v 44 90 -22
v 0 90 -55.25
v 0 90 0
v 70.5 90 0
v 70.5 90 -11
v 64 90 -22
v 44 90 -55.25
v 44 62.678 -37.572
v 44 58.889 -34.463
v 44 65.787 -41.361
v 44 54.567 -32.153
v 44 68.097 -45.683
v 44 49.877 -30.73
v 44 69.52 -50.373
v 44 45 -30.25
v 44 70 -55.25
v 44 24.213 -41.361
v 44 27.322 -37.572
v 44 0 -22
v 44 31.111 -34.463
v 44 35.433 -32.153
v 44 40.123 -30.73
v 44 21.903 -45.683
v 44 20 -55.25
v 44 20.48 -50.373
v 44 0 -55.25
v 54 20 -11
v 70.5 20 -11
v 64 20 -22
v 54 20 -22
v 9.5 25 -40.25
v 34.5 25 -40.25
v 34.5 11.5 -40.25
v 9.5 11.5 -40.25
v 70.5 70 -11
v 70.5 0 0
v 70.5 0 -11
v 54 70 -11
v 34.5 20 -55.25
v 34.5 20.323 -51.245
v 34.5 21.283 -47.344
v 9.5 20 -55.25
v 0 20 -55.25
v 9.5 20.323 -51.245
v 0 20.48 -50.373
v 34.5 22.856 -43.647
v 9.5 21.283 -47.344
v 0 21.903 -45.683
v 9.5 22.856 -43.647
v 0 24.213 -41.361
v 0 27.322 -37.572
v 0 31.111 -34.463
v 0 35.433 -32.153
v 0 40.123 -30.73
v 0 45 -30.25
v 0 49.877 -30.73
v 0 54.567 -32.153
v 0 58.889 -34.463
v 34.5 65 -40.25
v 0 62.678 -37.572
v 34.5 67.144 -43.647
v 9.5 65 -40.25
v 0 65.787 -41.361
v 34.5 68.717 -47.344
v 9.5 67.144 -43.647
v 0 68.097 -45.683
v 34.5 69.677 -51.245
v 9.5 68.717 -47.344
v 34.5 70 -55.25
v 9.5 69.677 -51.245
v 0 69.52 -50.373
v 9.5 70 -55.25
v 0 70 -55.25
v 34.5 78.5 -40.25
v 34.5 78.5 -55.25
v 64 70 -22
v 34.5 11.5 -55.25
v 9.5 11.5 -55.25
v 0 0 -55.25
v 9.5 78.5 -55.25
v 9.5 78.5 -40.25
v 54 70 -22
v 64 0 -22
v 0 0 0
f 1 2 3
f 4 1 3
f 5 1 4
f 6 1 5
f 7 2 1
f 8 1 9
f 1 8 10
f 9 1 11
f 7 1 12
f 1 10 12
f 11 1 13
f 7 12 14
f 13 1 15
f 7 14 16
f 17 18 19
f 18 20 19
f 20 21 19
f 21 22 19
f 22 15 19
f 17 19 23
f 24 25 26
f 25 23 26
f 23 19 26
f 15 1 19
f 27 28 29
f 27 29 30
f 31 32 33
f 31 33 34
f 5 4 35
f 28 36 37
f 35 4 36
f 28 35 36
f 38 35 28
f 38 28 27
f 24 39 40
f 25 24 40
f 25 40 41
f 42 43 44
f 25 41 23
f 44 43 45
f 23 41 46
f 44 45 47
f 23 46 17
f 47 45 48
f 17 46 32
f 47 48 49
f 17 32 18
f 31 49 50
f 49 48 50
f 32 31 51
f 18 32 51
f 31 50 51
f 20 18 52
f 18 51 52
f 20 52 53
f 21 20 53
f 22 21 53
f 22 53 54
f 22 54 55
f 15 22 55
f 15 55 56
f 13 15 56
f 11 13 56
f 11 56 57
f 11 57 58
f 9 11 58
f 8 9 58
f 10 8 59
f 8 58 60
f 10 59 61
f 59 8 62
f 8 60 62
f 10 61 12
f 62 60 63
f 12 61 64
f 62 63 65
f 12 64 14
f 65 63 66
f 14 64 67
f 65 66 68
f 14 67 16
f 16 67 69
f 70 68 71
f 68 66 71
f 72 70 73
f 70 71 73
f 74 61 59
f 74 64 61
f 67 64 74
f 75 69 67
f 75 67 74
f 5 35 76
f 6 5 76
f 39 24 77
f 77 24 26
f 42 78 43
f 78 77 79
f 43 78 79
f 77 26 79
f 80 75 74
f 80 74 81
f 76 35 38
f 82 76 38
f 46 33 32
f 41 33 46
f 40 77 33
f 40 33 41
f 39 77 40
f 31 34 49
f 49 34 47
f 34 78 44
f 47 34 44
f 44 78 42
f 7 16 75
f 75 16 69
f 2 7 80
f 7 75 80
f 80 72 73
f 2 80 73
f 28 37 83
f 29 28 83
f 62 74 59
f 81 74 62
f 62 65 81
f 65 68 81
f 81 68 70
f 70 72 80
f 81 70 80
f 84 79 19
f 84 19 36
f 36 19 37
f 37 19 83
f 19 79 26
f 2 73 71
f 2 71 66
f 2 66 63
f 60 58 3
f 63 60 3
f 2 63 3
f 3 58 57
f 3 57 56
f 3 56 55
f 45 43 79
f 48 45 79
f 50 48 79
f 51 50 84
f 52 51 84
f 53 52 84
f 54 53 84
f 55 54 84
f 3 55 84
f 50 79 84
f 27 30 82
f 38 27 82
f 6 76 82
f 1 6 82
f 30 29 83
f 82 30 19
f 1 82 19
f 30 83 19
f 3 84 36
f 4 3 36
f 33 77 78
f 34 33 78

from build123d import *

# Parameters (mm, degrees)
BOSS_EXTRUDE1_DEPTH     = 90
CUT_EXTRUDE6_DEPTH      = 115.405255561
CUT_EXTRUDE6_DEPTH_BACK = 44
SKETCH8_W               = 25
SKETCH8_H               = 15
CUT_EXTRUDE9_DEPTH      = 15
SKETCH13_W              = 16.5
SKETCH13_H              = 50
CUT_EXTRUDE18_DEPTH     = 11


with BuildPart() as part:
    # Sketch1 → Boss-Extrude1 (new body)
    with BuildSketch(Plane(origin=(0, 0, 0), x_dir=(1, 0, 0), z_dir=(0, 1, 0))):
        Polygon((0, 0), (70.5, 0), (70.5, 11), (64, 22), (44, 22), (44, 55.25), (0, 55.25), align=None)
    extrude(amount=BOSS_EXTRUDE1_DEPTH)

    # Sketch7 → Cut-Extrude6 (cut, two sides: drawn at the far end of the back side and taken through both)
    with BuildSketch(Plane(origin=(44, 0, 0), x_dir=(0, 0, -1), z_dir=(1, 0, 0)).offset(-CUT_EXTRUDE6_DEPTH_BACK)):
        with BuildLine():
            Line((243.604282259, 20), (55.25, 20))
            ThreePointArc((55.25, 20), (30.25, 45), (55.25, 70))
            Line((55.25, 70), (243.604282259, 70))
            Line((243.604282259, 70), (620.312846776, 70))
            Line((620.312846776, 70), (620.312846776, 20))
            Line((620.312846776, 20), (243.604282259, 20))
        make_face()
    extrude(amount=CUT_EXTRUDE6_DEPTH + CUT_EXTRUDE6_DEPTH_BACK, mode=Mode.SUBTRACT)

    # Sketch8 → Cut-Extrude9 (cut)
    with BuildSketch(Plane(origin=(0, 0, -55.25), x_dir=(-1, 0, 0), z_dir=(0, 0, -1))):
        with Locations((-22, 71)):
            Rectangle(SKETCH8_W, SKETCH8_H)
        with Locations((-22, 19)):
            Rectangle(SKETCH8_W, SKETCH8_H)
    extrude(amount=-CUT_EXTRUDE9_DEPTH, mode=Mode.SUBTRACT)

    # Sketch13 → Cut-Extrude18 (cut)
    with BuildSketch(Plane(origin=(0, 0, -22), x_dir=(-1, 0, 0), z_dir=(0, 0, -1))):
        with Locations((-62.25, 45)):
            Rectangle(SKETCH13_W, SKETCH13_H)
    extrude(amount=-CUT_EXTRUDE18_DEPTH, mode=Mode.SUBTRACT)


solid = part.part
